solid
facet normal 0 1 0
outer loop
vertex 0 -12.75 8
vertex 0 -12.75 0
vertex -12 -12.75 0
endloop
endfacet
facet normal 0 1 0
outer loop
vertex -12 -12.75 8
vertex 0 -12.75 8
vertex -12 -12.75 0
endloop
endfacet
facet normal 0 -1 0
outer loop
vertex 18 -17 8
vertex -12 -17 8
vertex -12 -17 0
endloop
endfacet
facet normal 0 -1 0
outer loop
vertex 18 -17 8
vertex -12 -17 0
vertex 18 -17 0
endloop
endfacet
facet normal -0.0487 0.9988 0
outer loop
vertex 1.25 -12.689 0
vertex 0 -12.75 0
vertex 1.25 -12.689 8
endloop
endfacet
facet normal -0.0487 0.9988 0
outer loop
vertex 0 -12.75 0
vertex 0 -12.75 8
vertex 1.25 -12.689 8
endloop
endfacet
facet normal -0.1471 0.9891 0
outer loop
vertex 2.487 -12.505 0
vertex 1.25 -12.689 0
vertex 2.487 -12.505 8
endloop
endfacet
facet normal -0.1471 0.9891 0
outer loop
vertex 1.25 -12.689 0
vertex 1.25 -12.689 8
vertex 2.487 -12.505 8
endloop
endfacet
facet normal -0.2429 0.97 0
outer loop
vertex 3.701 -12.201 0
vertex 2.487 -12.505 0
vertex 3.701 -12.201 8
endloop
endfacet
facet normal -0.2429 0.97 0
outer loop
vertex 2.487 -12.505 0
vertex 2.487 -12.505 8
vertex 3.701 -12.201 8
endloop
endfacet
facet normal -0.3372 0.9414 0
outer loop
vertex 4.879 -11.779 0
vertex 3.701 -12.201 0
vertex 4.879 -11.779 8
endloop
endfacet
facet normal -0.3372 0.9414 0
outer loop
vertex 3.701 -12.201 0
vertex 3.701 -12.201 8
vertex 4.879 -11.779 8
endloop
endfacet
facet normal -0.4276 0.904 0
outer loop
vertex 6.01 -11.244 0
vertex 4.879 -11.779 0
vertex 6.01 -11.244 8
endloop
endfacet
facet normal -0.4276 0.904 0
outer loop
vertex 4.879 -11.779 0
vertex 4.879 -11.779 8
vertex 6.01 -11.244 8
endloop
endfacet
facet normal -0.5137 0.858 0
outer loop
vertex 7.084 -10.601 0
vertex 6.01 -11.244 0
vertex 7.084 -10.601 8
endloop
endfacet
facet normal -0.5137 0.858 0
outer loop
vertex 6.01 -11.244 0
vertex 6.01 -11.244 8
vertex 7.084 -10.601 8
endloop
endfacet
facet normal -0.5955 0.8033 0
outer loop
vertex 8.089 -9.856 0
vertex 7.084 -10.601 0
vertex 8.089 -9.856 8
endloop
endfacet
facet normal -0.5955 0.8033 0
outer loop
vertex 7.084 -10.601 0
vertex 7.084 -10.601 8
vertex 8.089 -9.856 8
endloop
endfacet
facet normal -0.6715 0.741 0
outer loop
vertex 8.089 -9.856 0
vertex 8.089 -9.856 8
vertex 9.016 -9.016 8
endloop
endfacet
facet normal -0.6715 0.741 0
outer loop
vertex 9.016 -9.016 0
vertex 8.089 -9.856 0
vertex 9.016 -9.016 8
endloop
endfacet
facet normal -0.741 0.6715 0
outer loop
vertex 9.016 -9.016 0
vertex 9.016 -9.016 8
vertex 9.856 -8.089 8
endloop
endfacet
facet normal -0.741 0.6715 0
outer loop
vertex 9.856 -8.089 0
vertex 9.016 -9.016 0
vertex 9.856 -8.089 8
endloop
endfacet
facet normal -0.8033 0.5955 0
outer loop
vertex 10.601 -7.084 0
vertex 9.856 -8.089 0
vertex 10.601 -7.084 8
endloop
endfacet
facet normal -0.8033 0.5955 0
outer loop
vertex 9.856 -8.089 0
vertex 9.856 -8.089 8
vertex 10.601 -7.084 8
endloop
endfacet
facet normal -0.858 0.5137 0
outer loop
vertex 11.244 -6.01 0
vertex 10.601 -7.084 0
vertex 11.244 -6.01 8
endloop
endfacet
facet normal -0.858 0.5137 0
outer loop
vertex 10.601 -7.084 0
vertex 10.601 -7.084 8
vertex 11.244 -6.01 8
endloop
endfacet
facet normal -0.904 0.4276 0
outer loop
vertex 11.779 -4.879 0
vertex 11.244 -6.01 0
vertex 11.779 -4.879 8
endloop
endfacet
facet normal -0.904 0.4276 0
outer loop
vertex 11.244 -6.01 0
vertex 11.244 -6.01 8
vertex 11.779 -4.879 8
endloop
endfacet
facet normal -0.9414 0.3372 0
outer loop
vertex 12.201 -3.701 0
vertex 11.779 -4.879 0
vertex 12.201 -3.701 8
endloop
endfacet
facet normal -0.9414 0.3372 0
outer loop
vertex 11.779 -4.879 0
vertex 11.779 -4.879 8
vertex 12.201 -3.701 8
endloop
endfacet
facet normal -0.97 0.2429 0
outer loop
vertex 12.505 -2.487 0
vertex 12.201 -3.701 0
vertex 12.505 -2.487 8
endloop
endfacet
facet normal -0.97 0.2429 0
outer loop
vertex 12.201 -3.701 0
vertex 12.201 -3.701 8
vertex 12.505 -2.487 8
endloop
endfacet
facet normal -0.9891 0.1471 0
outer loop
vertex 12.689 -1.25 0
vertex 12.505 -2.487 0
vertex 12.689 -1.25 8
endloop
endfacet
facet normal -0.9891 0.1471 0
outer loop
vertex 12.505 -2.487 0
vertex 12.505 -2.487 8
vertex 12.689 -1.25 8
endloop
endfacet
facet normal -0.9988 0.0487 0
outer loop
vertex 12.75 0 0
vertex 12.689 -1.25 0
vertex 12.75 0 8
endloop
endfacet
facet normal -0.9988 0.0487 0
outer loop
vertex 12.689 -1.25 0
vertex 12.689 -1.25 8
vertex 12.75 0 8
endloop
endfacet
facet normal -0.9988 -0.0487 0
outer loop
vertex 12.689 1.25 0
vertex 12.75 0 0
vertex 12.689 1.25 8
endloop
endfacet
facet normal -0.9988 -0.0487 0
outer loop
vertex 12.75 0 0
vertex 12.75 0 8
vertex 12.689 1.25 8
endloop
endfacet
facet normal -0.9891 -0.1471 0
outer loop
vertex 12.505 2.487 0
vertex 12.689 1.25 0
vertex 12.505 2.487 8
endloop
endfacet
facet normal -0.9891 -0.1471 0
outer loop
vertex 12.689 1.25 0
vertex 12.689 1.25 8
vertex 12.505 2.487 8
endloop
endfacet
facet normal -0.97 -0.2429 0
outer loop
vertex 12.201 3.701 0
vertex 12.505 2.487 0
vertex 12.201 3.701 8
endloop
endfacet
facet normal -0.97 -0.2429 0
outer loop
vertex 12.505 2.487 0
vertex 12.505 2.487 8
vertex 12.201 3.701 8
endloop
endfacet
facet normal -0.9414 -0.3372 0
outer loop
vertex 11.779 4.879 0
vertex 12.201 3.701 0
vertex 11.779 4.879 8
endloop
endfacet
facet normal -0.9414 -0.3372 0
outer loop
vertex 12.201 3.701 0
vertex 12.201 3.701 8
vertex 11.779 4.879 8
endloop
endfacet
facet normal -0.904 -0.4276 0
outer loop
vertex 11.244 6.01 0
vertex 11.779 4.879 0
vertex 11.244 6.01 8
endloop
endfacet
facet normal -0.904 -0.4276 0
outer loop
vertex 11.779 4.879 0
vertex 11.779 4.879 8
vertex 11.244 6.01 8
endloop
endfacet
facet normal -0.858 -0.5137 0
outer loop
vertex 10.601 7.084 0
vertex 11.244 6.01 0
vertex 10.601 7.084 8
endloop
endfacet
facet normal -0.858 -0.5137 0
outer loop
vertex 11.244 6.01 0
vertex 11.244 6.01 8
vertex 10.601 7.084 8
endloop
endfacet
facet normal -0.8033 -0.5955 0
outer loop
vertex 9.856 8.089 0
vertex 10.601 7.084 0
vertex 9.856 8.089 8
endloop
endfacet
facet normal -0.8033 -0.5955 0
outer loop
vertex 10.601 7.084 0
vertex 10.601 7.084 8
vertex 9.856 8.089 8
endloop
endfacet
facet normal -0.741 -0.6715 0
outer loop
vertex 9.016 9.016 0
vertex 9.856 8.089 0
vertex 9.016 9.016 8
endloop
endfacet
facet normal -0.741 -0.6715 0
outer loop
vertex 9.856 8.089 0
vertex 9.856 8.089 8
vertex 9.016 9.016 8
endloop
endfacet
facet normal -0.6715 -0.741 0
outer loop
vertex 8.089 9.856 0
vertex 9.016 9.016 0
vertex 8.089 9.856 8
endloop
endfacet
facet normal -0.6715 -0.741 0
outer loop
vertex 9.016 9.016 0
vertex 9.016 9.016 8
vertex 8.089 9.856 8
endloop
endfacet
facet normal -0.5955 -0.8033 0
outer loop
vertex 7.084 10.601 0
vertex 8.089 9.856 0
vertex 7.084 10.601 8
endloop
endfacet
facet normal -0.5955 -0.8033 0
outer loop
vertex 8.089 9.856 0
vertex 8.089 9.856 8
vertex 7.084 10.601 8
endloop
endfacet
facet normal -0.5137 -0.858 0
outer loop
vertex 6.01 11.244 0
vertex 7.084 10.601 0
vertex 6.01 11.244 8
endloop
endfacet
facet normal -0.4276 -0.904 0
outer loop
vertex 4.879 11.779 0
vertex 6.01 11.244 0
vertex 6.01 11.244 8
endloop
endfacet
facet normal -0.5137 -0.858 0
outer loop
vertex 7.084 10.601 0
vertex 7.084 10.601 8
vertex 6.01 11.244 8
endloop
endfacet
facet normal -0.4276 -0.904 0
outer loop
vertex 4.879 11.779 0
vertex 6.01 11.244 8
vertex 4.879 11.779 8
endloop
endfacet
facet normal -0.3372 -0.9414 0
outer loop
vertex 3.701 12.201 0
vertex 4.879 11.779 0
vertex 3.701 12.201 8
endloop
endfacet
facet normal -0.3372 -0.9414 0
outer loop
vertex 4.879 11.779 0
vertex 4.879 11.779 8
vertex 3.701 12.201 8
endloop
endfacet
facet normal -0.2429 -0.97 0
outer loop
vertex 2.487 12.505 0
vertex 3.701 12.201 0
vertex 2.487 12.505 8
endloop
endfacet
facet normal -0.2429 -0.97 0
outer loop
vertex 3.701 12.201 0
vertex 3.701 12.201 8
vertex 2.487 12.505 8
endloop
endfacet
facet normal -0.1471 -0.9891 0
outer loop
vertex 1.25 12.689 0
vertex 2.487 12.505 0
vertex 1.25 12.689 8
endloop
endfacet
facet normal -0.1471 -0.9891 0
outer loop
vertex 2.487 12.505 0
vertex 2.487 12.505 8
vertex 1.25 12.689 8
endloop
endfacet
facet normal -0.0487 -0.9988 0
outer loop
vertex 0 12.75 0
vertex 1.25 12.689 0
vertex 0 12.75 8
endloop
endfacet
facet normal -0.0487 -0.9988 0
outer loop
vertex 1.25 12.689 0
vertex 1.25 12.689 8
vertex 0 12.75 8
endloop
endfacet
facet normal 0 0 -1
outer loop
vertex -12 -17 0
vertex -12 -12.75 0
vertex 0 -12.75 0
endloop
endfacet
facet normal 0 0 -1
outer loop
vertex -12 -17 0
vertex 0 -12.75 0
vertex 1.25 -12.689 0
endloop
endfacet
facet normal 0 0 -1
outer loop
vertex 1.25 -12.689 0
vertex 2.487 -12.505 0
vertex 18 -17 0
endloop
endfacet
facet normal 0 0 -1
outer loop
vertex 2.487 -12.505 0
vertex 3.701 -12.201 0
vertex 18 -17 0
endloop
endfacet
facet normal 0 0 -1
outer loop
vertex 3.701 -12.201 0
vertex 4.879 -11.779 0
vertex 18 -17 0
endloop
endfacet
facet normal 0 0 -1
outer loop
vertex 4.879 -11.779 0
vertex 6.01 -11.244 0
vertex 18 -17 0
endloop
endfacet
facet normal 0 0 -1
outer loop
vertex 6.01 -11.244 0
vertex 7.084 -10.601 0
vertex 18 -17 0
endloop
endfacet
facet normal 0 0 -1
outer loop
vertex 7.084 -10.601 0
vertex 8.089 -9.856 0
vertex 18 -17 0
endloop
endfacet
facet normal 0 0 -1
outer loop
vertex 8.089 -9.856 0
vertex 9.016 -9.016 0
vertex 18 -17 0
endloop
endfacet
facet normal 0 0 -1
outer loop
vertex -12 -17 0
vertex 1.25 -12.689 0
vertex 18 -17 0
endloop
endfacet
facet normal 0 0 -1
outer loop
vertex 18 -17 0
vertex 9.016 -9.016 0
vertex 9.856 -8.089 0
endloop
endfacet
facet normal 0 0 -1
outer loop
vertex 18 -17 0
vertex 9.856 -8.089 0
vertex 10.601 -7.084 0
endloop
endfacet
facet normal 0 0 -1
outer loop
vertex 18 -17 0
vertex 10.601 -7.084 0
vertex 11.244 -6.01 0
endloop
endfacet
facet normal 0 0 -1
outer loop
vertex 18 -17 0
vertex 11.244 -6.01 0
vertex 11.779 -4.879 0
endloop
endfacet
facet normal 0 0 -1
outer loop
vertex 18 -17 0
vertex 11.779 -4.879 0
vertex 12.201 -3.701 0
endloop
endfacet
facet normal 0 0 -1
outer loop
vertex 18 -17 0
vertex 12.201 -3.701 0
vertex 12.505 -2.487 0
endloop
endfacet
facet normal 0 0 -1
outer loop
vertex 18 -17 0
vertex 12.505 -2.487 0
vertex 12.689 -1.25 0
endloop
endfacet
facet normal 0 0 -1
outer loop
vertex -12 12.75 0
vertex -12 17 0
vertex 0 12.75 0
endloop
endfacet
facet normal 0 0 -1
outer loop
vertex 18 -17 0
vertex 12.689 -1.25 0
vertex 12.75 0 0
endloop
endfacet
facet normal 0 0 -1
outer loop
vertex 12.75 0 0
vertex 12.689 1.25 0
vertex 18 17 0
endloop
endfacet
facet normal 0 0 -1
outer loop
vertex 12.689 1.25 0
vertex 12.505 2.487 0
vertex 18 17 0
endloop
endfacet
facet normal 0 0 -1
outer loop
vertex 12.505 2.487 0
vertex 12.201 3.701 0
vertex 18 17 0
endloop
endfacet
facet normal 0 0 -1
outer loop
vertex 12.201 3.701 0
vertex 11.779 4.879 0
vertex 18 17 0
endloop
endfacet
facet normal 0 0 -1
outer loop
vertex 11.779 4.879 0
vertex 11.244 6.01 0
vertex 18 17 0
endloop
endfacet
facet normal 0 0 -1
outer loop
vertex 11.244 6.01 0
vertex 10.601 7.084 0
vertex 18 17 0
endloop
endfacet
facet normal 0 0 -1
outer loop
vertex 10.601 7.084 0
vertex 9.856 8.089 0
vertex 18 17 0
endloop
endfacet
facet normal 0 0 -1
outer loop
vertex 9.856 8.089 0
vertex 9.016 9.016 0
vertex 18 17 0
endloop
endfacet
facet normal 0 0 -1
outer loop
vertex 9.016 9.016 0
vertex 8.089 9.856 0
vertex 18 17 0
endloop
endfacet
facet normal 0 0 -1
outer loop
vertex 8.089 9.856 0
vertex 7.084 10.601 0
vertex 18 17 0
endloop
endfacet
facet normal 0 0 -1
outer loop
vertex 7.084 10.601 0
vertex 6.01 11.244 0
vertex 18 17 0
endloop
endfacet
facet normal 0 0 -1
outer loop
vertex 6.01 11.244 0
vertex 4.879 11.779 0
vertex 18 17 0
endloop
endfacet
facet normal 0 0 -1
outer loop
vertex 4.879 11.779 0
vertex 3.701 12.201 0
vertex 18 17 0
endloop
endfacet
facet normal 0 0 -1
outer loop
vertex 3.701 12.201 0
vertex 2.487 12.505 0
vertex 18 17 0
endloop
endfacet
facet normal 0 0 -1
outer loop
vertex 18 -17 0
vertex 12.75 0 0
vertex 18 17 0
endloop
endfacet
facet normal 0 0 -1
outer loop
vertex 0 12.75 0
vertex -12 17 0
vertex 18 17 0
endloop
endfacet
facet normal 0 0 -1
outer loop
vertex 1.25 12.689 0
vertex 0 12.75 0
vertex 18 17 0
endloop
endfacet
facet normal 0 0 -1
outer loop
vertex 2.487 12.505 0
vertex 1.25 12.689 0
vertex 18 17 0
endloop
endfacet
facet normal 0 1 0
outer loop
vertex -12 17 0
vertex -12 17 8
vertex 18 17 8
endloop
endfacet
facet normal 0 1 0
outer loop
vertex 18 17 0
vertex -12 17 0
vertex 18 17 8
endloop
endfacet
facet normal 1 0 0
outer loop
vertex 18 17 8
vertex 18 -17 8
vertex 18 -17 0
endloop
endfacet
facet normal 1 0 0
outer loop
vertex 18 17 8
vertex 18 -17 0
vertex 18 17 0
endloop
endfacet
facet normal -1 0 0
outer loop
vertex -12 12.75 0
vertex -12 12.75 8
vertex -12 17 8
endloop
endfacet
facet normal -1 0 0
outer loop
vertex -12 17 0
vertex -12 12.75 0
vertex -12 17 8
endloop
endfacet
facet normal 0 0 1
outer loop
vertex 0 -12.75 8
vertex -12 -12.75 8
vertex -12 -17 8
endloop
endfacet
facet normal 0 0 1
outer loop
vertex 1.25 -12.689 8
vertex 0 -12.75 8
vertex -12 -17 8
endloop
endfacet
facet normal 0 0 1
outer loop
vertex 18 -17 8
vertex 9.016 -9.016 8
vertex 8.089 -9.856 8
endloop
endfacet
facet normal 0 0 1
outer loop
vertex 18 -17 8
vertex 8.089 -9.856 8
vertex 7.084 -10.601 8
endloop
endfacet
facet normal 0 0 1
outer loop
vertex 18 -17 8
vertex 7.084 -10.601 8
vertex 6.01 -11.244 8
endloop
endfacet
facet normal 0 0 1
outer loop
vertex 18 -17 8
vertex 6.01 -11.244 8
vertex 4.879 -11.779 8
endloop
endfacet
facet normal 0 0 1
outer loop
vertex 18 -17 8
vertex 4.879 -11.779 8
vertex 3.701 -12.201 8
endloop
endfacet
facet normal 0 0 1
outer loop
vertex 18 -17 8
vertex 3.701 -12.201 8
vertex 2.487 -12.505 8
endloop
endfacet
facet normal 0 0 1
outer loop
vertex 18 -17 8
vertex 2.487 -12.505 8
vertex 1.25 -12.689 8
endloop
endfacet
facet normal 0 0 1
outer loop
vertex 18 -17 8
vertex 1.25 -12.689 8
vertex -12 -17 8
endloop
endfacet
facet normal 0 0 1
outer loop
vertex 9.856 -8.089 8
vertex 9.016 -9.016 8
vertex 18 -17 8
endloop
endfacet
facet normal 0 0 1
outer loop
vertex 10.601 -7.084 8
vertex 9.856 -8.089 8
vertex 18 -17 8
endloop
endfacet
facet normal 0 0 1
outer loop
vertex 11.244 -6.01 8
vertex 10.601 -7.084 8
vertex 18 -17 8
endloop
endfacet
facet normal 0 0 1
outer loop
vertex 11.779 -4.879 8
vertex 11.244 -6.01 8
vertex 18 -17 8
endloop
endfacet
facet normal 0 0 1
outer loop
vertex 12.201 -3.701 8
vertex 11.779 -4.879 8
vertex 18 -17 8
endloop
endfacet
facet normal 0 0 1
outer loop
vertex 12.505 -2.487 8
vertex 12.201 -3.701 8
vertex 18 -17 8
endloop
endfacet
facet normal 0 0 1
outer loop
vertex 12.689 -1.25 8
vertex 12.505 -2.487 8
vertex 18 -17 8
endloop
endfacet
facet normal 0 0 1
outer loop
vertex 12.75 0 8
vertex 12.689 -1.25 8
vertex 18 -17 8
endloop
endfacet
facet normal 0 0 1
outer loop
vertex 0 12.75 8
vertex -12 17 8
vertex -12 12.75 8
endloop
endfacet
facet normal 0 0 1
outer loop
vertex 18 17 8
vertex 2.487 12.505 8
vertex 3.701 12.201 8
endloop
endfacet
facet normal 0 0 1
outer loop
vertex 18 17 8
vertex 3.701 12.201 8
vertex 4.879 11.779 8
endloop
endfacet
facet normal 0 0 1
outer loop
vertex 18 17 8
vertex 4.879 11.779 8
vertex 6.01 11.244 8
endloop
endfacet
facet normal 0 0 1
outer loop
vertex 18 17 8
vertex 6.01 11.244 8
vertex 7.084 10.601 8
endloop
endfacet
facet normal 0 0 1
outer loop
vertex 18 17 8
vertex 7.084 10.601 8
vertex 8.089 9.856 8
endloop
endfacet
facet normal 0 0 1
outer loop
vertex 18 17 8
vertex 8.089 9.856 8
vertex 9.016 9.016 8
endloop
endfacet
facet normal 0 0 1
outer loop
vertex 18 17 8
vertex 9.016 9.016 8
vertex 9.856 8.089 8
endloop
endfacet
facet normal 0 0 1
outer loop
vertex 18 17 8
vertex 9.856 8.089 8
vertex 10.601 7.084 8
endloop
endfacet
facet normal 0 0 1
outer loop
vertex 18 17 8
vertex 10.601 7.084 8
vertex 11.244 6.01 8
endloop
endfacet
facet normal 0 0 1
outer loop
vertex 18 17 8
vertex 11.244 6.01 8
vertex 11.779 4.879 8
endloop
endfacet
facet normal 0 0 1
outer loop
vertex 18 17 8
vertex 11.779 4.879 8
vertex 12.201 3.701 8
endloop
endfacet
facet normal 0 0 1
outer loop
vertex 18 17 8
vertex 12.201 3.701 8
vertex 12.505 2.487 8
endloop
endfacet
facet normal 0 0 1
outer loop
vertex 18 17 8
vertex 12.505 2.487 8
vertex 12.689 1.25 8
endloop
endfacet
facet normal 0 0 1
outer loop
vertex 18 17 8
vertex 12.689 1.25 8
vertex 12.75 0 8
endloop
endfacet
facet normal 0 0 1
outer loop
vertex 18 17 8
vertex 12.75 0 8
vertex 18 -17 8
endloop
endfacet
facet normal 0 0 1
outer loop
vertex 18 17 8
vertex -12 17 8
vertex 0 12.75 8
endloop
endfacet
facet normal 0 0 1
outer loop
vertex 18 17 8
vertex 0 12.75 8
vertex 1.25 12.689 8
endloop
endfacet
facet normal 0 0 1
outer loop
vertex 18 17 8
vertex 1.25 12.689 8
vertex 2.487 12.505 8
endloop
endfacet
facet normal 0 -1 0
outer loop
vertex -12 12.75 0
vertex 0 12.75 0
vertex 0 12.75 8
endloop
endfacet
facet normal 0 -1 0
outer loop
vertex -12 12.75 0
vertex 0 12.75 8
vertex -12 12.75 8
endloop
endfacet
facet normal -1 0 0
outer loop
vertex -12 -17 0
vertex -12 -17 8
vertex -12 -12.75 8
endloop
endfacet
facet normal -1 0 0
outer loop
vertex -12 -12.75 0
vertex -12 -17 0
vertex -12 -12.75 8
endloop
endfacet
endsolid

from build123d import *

# Parameters (mm, degrees)
SKETCH_1_R          = 17
EXTRUDE_1_DEPTH     = 8
SKETCH_3_W          = 30
SKETCH_3_H          = 34
EXTRUDE_2_DEPTH     = 8
SKETCH_2_R          = 12.75
CUT_EXTRUDE_1_DEPTH = 8
SKETCH_4_W          = 19.904573782
SKETCH_4_H          = 25.5
CUT_EXTRUDE_2_DEPTH = 8


with BuildPart() as part:
    # 스케치1 → 보스-돌출1 (new body)
    with BuildSketch(Plane.XY):
        Circle(SKETCH_1_R)
    extrude(amount=EXTRUDE_1_DEPTH)

    # 스케치3 → 보스-돌출2 (add)
    with BuildSketch(Plane.XY.offset(8)):
        with Locations((3, 0)):
            Rectangle(SKETCH_3_W, SKETCH_3_H)
    extrude(amount=-EXTRUDE_2_DEPTH)

    # 스케치2 → 컷-돌출1 (cut)
    with BuildSketch(Plane.XY.offset(8)):
        Circle(SKETCH_2_R)
    extrude(amount=-CUT_EXTRUDE_1_DEPTH, mode=Mode.SUBTRACT)

    # 스케치4 → 컷-돌출2 (cut)
    with BuildSketch(Plane(origin=(0, 0, 0), x_dir=(-1, 0, 0), z_dir=(0, 0, -1))):
        with Locations((9.952286891, 0)):
            Rectangle(SKETCH_4_W, SKETCH_4_H)
    extrude(amount=-CUT_EXTRUDE_2_DEPTH, mode=Mode.SUBTRACT)


solid = part.part
